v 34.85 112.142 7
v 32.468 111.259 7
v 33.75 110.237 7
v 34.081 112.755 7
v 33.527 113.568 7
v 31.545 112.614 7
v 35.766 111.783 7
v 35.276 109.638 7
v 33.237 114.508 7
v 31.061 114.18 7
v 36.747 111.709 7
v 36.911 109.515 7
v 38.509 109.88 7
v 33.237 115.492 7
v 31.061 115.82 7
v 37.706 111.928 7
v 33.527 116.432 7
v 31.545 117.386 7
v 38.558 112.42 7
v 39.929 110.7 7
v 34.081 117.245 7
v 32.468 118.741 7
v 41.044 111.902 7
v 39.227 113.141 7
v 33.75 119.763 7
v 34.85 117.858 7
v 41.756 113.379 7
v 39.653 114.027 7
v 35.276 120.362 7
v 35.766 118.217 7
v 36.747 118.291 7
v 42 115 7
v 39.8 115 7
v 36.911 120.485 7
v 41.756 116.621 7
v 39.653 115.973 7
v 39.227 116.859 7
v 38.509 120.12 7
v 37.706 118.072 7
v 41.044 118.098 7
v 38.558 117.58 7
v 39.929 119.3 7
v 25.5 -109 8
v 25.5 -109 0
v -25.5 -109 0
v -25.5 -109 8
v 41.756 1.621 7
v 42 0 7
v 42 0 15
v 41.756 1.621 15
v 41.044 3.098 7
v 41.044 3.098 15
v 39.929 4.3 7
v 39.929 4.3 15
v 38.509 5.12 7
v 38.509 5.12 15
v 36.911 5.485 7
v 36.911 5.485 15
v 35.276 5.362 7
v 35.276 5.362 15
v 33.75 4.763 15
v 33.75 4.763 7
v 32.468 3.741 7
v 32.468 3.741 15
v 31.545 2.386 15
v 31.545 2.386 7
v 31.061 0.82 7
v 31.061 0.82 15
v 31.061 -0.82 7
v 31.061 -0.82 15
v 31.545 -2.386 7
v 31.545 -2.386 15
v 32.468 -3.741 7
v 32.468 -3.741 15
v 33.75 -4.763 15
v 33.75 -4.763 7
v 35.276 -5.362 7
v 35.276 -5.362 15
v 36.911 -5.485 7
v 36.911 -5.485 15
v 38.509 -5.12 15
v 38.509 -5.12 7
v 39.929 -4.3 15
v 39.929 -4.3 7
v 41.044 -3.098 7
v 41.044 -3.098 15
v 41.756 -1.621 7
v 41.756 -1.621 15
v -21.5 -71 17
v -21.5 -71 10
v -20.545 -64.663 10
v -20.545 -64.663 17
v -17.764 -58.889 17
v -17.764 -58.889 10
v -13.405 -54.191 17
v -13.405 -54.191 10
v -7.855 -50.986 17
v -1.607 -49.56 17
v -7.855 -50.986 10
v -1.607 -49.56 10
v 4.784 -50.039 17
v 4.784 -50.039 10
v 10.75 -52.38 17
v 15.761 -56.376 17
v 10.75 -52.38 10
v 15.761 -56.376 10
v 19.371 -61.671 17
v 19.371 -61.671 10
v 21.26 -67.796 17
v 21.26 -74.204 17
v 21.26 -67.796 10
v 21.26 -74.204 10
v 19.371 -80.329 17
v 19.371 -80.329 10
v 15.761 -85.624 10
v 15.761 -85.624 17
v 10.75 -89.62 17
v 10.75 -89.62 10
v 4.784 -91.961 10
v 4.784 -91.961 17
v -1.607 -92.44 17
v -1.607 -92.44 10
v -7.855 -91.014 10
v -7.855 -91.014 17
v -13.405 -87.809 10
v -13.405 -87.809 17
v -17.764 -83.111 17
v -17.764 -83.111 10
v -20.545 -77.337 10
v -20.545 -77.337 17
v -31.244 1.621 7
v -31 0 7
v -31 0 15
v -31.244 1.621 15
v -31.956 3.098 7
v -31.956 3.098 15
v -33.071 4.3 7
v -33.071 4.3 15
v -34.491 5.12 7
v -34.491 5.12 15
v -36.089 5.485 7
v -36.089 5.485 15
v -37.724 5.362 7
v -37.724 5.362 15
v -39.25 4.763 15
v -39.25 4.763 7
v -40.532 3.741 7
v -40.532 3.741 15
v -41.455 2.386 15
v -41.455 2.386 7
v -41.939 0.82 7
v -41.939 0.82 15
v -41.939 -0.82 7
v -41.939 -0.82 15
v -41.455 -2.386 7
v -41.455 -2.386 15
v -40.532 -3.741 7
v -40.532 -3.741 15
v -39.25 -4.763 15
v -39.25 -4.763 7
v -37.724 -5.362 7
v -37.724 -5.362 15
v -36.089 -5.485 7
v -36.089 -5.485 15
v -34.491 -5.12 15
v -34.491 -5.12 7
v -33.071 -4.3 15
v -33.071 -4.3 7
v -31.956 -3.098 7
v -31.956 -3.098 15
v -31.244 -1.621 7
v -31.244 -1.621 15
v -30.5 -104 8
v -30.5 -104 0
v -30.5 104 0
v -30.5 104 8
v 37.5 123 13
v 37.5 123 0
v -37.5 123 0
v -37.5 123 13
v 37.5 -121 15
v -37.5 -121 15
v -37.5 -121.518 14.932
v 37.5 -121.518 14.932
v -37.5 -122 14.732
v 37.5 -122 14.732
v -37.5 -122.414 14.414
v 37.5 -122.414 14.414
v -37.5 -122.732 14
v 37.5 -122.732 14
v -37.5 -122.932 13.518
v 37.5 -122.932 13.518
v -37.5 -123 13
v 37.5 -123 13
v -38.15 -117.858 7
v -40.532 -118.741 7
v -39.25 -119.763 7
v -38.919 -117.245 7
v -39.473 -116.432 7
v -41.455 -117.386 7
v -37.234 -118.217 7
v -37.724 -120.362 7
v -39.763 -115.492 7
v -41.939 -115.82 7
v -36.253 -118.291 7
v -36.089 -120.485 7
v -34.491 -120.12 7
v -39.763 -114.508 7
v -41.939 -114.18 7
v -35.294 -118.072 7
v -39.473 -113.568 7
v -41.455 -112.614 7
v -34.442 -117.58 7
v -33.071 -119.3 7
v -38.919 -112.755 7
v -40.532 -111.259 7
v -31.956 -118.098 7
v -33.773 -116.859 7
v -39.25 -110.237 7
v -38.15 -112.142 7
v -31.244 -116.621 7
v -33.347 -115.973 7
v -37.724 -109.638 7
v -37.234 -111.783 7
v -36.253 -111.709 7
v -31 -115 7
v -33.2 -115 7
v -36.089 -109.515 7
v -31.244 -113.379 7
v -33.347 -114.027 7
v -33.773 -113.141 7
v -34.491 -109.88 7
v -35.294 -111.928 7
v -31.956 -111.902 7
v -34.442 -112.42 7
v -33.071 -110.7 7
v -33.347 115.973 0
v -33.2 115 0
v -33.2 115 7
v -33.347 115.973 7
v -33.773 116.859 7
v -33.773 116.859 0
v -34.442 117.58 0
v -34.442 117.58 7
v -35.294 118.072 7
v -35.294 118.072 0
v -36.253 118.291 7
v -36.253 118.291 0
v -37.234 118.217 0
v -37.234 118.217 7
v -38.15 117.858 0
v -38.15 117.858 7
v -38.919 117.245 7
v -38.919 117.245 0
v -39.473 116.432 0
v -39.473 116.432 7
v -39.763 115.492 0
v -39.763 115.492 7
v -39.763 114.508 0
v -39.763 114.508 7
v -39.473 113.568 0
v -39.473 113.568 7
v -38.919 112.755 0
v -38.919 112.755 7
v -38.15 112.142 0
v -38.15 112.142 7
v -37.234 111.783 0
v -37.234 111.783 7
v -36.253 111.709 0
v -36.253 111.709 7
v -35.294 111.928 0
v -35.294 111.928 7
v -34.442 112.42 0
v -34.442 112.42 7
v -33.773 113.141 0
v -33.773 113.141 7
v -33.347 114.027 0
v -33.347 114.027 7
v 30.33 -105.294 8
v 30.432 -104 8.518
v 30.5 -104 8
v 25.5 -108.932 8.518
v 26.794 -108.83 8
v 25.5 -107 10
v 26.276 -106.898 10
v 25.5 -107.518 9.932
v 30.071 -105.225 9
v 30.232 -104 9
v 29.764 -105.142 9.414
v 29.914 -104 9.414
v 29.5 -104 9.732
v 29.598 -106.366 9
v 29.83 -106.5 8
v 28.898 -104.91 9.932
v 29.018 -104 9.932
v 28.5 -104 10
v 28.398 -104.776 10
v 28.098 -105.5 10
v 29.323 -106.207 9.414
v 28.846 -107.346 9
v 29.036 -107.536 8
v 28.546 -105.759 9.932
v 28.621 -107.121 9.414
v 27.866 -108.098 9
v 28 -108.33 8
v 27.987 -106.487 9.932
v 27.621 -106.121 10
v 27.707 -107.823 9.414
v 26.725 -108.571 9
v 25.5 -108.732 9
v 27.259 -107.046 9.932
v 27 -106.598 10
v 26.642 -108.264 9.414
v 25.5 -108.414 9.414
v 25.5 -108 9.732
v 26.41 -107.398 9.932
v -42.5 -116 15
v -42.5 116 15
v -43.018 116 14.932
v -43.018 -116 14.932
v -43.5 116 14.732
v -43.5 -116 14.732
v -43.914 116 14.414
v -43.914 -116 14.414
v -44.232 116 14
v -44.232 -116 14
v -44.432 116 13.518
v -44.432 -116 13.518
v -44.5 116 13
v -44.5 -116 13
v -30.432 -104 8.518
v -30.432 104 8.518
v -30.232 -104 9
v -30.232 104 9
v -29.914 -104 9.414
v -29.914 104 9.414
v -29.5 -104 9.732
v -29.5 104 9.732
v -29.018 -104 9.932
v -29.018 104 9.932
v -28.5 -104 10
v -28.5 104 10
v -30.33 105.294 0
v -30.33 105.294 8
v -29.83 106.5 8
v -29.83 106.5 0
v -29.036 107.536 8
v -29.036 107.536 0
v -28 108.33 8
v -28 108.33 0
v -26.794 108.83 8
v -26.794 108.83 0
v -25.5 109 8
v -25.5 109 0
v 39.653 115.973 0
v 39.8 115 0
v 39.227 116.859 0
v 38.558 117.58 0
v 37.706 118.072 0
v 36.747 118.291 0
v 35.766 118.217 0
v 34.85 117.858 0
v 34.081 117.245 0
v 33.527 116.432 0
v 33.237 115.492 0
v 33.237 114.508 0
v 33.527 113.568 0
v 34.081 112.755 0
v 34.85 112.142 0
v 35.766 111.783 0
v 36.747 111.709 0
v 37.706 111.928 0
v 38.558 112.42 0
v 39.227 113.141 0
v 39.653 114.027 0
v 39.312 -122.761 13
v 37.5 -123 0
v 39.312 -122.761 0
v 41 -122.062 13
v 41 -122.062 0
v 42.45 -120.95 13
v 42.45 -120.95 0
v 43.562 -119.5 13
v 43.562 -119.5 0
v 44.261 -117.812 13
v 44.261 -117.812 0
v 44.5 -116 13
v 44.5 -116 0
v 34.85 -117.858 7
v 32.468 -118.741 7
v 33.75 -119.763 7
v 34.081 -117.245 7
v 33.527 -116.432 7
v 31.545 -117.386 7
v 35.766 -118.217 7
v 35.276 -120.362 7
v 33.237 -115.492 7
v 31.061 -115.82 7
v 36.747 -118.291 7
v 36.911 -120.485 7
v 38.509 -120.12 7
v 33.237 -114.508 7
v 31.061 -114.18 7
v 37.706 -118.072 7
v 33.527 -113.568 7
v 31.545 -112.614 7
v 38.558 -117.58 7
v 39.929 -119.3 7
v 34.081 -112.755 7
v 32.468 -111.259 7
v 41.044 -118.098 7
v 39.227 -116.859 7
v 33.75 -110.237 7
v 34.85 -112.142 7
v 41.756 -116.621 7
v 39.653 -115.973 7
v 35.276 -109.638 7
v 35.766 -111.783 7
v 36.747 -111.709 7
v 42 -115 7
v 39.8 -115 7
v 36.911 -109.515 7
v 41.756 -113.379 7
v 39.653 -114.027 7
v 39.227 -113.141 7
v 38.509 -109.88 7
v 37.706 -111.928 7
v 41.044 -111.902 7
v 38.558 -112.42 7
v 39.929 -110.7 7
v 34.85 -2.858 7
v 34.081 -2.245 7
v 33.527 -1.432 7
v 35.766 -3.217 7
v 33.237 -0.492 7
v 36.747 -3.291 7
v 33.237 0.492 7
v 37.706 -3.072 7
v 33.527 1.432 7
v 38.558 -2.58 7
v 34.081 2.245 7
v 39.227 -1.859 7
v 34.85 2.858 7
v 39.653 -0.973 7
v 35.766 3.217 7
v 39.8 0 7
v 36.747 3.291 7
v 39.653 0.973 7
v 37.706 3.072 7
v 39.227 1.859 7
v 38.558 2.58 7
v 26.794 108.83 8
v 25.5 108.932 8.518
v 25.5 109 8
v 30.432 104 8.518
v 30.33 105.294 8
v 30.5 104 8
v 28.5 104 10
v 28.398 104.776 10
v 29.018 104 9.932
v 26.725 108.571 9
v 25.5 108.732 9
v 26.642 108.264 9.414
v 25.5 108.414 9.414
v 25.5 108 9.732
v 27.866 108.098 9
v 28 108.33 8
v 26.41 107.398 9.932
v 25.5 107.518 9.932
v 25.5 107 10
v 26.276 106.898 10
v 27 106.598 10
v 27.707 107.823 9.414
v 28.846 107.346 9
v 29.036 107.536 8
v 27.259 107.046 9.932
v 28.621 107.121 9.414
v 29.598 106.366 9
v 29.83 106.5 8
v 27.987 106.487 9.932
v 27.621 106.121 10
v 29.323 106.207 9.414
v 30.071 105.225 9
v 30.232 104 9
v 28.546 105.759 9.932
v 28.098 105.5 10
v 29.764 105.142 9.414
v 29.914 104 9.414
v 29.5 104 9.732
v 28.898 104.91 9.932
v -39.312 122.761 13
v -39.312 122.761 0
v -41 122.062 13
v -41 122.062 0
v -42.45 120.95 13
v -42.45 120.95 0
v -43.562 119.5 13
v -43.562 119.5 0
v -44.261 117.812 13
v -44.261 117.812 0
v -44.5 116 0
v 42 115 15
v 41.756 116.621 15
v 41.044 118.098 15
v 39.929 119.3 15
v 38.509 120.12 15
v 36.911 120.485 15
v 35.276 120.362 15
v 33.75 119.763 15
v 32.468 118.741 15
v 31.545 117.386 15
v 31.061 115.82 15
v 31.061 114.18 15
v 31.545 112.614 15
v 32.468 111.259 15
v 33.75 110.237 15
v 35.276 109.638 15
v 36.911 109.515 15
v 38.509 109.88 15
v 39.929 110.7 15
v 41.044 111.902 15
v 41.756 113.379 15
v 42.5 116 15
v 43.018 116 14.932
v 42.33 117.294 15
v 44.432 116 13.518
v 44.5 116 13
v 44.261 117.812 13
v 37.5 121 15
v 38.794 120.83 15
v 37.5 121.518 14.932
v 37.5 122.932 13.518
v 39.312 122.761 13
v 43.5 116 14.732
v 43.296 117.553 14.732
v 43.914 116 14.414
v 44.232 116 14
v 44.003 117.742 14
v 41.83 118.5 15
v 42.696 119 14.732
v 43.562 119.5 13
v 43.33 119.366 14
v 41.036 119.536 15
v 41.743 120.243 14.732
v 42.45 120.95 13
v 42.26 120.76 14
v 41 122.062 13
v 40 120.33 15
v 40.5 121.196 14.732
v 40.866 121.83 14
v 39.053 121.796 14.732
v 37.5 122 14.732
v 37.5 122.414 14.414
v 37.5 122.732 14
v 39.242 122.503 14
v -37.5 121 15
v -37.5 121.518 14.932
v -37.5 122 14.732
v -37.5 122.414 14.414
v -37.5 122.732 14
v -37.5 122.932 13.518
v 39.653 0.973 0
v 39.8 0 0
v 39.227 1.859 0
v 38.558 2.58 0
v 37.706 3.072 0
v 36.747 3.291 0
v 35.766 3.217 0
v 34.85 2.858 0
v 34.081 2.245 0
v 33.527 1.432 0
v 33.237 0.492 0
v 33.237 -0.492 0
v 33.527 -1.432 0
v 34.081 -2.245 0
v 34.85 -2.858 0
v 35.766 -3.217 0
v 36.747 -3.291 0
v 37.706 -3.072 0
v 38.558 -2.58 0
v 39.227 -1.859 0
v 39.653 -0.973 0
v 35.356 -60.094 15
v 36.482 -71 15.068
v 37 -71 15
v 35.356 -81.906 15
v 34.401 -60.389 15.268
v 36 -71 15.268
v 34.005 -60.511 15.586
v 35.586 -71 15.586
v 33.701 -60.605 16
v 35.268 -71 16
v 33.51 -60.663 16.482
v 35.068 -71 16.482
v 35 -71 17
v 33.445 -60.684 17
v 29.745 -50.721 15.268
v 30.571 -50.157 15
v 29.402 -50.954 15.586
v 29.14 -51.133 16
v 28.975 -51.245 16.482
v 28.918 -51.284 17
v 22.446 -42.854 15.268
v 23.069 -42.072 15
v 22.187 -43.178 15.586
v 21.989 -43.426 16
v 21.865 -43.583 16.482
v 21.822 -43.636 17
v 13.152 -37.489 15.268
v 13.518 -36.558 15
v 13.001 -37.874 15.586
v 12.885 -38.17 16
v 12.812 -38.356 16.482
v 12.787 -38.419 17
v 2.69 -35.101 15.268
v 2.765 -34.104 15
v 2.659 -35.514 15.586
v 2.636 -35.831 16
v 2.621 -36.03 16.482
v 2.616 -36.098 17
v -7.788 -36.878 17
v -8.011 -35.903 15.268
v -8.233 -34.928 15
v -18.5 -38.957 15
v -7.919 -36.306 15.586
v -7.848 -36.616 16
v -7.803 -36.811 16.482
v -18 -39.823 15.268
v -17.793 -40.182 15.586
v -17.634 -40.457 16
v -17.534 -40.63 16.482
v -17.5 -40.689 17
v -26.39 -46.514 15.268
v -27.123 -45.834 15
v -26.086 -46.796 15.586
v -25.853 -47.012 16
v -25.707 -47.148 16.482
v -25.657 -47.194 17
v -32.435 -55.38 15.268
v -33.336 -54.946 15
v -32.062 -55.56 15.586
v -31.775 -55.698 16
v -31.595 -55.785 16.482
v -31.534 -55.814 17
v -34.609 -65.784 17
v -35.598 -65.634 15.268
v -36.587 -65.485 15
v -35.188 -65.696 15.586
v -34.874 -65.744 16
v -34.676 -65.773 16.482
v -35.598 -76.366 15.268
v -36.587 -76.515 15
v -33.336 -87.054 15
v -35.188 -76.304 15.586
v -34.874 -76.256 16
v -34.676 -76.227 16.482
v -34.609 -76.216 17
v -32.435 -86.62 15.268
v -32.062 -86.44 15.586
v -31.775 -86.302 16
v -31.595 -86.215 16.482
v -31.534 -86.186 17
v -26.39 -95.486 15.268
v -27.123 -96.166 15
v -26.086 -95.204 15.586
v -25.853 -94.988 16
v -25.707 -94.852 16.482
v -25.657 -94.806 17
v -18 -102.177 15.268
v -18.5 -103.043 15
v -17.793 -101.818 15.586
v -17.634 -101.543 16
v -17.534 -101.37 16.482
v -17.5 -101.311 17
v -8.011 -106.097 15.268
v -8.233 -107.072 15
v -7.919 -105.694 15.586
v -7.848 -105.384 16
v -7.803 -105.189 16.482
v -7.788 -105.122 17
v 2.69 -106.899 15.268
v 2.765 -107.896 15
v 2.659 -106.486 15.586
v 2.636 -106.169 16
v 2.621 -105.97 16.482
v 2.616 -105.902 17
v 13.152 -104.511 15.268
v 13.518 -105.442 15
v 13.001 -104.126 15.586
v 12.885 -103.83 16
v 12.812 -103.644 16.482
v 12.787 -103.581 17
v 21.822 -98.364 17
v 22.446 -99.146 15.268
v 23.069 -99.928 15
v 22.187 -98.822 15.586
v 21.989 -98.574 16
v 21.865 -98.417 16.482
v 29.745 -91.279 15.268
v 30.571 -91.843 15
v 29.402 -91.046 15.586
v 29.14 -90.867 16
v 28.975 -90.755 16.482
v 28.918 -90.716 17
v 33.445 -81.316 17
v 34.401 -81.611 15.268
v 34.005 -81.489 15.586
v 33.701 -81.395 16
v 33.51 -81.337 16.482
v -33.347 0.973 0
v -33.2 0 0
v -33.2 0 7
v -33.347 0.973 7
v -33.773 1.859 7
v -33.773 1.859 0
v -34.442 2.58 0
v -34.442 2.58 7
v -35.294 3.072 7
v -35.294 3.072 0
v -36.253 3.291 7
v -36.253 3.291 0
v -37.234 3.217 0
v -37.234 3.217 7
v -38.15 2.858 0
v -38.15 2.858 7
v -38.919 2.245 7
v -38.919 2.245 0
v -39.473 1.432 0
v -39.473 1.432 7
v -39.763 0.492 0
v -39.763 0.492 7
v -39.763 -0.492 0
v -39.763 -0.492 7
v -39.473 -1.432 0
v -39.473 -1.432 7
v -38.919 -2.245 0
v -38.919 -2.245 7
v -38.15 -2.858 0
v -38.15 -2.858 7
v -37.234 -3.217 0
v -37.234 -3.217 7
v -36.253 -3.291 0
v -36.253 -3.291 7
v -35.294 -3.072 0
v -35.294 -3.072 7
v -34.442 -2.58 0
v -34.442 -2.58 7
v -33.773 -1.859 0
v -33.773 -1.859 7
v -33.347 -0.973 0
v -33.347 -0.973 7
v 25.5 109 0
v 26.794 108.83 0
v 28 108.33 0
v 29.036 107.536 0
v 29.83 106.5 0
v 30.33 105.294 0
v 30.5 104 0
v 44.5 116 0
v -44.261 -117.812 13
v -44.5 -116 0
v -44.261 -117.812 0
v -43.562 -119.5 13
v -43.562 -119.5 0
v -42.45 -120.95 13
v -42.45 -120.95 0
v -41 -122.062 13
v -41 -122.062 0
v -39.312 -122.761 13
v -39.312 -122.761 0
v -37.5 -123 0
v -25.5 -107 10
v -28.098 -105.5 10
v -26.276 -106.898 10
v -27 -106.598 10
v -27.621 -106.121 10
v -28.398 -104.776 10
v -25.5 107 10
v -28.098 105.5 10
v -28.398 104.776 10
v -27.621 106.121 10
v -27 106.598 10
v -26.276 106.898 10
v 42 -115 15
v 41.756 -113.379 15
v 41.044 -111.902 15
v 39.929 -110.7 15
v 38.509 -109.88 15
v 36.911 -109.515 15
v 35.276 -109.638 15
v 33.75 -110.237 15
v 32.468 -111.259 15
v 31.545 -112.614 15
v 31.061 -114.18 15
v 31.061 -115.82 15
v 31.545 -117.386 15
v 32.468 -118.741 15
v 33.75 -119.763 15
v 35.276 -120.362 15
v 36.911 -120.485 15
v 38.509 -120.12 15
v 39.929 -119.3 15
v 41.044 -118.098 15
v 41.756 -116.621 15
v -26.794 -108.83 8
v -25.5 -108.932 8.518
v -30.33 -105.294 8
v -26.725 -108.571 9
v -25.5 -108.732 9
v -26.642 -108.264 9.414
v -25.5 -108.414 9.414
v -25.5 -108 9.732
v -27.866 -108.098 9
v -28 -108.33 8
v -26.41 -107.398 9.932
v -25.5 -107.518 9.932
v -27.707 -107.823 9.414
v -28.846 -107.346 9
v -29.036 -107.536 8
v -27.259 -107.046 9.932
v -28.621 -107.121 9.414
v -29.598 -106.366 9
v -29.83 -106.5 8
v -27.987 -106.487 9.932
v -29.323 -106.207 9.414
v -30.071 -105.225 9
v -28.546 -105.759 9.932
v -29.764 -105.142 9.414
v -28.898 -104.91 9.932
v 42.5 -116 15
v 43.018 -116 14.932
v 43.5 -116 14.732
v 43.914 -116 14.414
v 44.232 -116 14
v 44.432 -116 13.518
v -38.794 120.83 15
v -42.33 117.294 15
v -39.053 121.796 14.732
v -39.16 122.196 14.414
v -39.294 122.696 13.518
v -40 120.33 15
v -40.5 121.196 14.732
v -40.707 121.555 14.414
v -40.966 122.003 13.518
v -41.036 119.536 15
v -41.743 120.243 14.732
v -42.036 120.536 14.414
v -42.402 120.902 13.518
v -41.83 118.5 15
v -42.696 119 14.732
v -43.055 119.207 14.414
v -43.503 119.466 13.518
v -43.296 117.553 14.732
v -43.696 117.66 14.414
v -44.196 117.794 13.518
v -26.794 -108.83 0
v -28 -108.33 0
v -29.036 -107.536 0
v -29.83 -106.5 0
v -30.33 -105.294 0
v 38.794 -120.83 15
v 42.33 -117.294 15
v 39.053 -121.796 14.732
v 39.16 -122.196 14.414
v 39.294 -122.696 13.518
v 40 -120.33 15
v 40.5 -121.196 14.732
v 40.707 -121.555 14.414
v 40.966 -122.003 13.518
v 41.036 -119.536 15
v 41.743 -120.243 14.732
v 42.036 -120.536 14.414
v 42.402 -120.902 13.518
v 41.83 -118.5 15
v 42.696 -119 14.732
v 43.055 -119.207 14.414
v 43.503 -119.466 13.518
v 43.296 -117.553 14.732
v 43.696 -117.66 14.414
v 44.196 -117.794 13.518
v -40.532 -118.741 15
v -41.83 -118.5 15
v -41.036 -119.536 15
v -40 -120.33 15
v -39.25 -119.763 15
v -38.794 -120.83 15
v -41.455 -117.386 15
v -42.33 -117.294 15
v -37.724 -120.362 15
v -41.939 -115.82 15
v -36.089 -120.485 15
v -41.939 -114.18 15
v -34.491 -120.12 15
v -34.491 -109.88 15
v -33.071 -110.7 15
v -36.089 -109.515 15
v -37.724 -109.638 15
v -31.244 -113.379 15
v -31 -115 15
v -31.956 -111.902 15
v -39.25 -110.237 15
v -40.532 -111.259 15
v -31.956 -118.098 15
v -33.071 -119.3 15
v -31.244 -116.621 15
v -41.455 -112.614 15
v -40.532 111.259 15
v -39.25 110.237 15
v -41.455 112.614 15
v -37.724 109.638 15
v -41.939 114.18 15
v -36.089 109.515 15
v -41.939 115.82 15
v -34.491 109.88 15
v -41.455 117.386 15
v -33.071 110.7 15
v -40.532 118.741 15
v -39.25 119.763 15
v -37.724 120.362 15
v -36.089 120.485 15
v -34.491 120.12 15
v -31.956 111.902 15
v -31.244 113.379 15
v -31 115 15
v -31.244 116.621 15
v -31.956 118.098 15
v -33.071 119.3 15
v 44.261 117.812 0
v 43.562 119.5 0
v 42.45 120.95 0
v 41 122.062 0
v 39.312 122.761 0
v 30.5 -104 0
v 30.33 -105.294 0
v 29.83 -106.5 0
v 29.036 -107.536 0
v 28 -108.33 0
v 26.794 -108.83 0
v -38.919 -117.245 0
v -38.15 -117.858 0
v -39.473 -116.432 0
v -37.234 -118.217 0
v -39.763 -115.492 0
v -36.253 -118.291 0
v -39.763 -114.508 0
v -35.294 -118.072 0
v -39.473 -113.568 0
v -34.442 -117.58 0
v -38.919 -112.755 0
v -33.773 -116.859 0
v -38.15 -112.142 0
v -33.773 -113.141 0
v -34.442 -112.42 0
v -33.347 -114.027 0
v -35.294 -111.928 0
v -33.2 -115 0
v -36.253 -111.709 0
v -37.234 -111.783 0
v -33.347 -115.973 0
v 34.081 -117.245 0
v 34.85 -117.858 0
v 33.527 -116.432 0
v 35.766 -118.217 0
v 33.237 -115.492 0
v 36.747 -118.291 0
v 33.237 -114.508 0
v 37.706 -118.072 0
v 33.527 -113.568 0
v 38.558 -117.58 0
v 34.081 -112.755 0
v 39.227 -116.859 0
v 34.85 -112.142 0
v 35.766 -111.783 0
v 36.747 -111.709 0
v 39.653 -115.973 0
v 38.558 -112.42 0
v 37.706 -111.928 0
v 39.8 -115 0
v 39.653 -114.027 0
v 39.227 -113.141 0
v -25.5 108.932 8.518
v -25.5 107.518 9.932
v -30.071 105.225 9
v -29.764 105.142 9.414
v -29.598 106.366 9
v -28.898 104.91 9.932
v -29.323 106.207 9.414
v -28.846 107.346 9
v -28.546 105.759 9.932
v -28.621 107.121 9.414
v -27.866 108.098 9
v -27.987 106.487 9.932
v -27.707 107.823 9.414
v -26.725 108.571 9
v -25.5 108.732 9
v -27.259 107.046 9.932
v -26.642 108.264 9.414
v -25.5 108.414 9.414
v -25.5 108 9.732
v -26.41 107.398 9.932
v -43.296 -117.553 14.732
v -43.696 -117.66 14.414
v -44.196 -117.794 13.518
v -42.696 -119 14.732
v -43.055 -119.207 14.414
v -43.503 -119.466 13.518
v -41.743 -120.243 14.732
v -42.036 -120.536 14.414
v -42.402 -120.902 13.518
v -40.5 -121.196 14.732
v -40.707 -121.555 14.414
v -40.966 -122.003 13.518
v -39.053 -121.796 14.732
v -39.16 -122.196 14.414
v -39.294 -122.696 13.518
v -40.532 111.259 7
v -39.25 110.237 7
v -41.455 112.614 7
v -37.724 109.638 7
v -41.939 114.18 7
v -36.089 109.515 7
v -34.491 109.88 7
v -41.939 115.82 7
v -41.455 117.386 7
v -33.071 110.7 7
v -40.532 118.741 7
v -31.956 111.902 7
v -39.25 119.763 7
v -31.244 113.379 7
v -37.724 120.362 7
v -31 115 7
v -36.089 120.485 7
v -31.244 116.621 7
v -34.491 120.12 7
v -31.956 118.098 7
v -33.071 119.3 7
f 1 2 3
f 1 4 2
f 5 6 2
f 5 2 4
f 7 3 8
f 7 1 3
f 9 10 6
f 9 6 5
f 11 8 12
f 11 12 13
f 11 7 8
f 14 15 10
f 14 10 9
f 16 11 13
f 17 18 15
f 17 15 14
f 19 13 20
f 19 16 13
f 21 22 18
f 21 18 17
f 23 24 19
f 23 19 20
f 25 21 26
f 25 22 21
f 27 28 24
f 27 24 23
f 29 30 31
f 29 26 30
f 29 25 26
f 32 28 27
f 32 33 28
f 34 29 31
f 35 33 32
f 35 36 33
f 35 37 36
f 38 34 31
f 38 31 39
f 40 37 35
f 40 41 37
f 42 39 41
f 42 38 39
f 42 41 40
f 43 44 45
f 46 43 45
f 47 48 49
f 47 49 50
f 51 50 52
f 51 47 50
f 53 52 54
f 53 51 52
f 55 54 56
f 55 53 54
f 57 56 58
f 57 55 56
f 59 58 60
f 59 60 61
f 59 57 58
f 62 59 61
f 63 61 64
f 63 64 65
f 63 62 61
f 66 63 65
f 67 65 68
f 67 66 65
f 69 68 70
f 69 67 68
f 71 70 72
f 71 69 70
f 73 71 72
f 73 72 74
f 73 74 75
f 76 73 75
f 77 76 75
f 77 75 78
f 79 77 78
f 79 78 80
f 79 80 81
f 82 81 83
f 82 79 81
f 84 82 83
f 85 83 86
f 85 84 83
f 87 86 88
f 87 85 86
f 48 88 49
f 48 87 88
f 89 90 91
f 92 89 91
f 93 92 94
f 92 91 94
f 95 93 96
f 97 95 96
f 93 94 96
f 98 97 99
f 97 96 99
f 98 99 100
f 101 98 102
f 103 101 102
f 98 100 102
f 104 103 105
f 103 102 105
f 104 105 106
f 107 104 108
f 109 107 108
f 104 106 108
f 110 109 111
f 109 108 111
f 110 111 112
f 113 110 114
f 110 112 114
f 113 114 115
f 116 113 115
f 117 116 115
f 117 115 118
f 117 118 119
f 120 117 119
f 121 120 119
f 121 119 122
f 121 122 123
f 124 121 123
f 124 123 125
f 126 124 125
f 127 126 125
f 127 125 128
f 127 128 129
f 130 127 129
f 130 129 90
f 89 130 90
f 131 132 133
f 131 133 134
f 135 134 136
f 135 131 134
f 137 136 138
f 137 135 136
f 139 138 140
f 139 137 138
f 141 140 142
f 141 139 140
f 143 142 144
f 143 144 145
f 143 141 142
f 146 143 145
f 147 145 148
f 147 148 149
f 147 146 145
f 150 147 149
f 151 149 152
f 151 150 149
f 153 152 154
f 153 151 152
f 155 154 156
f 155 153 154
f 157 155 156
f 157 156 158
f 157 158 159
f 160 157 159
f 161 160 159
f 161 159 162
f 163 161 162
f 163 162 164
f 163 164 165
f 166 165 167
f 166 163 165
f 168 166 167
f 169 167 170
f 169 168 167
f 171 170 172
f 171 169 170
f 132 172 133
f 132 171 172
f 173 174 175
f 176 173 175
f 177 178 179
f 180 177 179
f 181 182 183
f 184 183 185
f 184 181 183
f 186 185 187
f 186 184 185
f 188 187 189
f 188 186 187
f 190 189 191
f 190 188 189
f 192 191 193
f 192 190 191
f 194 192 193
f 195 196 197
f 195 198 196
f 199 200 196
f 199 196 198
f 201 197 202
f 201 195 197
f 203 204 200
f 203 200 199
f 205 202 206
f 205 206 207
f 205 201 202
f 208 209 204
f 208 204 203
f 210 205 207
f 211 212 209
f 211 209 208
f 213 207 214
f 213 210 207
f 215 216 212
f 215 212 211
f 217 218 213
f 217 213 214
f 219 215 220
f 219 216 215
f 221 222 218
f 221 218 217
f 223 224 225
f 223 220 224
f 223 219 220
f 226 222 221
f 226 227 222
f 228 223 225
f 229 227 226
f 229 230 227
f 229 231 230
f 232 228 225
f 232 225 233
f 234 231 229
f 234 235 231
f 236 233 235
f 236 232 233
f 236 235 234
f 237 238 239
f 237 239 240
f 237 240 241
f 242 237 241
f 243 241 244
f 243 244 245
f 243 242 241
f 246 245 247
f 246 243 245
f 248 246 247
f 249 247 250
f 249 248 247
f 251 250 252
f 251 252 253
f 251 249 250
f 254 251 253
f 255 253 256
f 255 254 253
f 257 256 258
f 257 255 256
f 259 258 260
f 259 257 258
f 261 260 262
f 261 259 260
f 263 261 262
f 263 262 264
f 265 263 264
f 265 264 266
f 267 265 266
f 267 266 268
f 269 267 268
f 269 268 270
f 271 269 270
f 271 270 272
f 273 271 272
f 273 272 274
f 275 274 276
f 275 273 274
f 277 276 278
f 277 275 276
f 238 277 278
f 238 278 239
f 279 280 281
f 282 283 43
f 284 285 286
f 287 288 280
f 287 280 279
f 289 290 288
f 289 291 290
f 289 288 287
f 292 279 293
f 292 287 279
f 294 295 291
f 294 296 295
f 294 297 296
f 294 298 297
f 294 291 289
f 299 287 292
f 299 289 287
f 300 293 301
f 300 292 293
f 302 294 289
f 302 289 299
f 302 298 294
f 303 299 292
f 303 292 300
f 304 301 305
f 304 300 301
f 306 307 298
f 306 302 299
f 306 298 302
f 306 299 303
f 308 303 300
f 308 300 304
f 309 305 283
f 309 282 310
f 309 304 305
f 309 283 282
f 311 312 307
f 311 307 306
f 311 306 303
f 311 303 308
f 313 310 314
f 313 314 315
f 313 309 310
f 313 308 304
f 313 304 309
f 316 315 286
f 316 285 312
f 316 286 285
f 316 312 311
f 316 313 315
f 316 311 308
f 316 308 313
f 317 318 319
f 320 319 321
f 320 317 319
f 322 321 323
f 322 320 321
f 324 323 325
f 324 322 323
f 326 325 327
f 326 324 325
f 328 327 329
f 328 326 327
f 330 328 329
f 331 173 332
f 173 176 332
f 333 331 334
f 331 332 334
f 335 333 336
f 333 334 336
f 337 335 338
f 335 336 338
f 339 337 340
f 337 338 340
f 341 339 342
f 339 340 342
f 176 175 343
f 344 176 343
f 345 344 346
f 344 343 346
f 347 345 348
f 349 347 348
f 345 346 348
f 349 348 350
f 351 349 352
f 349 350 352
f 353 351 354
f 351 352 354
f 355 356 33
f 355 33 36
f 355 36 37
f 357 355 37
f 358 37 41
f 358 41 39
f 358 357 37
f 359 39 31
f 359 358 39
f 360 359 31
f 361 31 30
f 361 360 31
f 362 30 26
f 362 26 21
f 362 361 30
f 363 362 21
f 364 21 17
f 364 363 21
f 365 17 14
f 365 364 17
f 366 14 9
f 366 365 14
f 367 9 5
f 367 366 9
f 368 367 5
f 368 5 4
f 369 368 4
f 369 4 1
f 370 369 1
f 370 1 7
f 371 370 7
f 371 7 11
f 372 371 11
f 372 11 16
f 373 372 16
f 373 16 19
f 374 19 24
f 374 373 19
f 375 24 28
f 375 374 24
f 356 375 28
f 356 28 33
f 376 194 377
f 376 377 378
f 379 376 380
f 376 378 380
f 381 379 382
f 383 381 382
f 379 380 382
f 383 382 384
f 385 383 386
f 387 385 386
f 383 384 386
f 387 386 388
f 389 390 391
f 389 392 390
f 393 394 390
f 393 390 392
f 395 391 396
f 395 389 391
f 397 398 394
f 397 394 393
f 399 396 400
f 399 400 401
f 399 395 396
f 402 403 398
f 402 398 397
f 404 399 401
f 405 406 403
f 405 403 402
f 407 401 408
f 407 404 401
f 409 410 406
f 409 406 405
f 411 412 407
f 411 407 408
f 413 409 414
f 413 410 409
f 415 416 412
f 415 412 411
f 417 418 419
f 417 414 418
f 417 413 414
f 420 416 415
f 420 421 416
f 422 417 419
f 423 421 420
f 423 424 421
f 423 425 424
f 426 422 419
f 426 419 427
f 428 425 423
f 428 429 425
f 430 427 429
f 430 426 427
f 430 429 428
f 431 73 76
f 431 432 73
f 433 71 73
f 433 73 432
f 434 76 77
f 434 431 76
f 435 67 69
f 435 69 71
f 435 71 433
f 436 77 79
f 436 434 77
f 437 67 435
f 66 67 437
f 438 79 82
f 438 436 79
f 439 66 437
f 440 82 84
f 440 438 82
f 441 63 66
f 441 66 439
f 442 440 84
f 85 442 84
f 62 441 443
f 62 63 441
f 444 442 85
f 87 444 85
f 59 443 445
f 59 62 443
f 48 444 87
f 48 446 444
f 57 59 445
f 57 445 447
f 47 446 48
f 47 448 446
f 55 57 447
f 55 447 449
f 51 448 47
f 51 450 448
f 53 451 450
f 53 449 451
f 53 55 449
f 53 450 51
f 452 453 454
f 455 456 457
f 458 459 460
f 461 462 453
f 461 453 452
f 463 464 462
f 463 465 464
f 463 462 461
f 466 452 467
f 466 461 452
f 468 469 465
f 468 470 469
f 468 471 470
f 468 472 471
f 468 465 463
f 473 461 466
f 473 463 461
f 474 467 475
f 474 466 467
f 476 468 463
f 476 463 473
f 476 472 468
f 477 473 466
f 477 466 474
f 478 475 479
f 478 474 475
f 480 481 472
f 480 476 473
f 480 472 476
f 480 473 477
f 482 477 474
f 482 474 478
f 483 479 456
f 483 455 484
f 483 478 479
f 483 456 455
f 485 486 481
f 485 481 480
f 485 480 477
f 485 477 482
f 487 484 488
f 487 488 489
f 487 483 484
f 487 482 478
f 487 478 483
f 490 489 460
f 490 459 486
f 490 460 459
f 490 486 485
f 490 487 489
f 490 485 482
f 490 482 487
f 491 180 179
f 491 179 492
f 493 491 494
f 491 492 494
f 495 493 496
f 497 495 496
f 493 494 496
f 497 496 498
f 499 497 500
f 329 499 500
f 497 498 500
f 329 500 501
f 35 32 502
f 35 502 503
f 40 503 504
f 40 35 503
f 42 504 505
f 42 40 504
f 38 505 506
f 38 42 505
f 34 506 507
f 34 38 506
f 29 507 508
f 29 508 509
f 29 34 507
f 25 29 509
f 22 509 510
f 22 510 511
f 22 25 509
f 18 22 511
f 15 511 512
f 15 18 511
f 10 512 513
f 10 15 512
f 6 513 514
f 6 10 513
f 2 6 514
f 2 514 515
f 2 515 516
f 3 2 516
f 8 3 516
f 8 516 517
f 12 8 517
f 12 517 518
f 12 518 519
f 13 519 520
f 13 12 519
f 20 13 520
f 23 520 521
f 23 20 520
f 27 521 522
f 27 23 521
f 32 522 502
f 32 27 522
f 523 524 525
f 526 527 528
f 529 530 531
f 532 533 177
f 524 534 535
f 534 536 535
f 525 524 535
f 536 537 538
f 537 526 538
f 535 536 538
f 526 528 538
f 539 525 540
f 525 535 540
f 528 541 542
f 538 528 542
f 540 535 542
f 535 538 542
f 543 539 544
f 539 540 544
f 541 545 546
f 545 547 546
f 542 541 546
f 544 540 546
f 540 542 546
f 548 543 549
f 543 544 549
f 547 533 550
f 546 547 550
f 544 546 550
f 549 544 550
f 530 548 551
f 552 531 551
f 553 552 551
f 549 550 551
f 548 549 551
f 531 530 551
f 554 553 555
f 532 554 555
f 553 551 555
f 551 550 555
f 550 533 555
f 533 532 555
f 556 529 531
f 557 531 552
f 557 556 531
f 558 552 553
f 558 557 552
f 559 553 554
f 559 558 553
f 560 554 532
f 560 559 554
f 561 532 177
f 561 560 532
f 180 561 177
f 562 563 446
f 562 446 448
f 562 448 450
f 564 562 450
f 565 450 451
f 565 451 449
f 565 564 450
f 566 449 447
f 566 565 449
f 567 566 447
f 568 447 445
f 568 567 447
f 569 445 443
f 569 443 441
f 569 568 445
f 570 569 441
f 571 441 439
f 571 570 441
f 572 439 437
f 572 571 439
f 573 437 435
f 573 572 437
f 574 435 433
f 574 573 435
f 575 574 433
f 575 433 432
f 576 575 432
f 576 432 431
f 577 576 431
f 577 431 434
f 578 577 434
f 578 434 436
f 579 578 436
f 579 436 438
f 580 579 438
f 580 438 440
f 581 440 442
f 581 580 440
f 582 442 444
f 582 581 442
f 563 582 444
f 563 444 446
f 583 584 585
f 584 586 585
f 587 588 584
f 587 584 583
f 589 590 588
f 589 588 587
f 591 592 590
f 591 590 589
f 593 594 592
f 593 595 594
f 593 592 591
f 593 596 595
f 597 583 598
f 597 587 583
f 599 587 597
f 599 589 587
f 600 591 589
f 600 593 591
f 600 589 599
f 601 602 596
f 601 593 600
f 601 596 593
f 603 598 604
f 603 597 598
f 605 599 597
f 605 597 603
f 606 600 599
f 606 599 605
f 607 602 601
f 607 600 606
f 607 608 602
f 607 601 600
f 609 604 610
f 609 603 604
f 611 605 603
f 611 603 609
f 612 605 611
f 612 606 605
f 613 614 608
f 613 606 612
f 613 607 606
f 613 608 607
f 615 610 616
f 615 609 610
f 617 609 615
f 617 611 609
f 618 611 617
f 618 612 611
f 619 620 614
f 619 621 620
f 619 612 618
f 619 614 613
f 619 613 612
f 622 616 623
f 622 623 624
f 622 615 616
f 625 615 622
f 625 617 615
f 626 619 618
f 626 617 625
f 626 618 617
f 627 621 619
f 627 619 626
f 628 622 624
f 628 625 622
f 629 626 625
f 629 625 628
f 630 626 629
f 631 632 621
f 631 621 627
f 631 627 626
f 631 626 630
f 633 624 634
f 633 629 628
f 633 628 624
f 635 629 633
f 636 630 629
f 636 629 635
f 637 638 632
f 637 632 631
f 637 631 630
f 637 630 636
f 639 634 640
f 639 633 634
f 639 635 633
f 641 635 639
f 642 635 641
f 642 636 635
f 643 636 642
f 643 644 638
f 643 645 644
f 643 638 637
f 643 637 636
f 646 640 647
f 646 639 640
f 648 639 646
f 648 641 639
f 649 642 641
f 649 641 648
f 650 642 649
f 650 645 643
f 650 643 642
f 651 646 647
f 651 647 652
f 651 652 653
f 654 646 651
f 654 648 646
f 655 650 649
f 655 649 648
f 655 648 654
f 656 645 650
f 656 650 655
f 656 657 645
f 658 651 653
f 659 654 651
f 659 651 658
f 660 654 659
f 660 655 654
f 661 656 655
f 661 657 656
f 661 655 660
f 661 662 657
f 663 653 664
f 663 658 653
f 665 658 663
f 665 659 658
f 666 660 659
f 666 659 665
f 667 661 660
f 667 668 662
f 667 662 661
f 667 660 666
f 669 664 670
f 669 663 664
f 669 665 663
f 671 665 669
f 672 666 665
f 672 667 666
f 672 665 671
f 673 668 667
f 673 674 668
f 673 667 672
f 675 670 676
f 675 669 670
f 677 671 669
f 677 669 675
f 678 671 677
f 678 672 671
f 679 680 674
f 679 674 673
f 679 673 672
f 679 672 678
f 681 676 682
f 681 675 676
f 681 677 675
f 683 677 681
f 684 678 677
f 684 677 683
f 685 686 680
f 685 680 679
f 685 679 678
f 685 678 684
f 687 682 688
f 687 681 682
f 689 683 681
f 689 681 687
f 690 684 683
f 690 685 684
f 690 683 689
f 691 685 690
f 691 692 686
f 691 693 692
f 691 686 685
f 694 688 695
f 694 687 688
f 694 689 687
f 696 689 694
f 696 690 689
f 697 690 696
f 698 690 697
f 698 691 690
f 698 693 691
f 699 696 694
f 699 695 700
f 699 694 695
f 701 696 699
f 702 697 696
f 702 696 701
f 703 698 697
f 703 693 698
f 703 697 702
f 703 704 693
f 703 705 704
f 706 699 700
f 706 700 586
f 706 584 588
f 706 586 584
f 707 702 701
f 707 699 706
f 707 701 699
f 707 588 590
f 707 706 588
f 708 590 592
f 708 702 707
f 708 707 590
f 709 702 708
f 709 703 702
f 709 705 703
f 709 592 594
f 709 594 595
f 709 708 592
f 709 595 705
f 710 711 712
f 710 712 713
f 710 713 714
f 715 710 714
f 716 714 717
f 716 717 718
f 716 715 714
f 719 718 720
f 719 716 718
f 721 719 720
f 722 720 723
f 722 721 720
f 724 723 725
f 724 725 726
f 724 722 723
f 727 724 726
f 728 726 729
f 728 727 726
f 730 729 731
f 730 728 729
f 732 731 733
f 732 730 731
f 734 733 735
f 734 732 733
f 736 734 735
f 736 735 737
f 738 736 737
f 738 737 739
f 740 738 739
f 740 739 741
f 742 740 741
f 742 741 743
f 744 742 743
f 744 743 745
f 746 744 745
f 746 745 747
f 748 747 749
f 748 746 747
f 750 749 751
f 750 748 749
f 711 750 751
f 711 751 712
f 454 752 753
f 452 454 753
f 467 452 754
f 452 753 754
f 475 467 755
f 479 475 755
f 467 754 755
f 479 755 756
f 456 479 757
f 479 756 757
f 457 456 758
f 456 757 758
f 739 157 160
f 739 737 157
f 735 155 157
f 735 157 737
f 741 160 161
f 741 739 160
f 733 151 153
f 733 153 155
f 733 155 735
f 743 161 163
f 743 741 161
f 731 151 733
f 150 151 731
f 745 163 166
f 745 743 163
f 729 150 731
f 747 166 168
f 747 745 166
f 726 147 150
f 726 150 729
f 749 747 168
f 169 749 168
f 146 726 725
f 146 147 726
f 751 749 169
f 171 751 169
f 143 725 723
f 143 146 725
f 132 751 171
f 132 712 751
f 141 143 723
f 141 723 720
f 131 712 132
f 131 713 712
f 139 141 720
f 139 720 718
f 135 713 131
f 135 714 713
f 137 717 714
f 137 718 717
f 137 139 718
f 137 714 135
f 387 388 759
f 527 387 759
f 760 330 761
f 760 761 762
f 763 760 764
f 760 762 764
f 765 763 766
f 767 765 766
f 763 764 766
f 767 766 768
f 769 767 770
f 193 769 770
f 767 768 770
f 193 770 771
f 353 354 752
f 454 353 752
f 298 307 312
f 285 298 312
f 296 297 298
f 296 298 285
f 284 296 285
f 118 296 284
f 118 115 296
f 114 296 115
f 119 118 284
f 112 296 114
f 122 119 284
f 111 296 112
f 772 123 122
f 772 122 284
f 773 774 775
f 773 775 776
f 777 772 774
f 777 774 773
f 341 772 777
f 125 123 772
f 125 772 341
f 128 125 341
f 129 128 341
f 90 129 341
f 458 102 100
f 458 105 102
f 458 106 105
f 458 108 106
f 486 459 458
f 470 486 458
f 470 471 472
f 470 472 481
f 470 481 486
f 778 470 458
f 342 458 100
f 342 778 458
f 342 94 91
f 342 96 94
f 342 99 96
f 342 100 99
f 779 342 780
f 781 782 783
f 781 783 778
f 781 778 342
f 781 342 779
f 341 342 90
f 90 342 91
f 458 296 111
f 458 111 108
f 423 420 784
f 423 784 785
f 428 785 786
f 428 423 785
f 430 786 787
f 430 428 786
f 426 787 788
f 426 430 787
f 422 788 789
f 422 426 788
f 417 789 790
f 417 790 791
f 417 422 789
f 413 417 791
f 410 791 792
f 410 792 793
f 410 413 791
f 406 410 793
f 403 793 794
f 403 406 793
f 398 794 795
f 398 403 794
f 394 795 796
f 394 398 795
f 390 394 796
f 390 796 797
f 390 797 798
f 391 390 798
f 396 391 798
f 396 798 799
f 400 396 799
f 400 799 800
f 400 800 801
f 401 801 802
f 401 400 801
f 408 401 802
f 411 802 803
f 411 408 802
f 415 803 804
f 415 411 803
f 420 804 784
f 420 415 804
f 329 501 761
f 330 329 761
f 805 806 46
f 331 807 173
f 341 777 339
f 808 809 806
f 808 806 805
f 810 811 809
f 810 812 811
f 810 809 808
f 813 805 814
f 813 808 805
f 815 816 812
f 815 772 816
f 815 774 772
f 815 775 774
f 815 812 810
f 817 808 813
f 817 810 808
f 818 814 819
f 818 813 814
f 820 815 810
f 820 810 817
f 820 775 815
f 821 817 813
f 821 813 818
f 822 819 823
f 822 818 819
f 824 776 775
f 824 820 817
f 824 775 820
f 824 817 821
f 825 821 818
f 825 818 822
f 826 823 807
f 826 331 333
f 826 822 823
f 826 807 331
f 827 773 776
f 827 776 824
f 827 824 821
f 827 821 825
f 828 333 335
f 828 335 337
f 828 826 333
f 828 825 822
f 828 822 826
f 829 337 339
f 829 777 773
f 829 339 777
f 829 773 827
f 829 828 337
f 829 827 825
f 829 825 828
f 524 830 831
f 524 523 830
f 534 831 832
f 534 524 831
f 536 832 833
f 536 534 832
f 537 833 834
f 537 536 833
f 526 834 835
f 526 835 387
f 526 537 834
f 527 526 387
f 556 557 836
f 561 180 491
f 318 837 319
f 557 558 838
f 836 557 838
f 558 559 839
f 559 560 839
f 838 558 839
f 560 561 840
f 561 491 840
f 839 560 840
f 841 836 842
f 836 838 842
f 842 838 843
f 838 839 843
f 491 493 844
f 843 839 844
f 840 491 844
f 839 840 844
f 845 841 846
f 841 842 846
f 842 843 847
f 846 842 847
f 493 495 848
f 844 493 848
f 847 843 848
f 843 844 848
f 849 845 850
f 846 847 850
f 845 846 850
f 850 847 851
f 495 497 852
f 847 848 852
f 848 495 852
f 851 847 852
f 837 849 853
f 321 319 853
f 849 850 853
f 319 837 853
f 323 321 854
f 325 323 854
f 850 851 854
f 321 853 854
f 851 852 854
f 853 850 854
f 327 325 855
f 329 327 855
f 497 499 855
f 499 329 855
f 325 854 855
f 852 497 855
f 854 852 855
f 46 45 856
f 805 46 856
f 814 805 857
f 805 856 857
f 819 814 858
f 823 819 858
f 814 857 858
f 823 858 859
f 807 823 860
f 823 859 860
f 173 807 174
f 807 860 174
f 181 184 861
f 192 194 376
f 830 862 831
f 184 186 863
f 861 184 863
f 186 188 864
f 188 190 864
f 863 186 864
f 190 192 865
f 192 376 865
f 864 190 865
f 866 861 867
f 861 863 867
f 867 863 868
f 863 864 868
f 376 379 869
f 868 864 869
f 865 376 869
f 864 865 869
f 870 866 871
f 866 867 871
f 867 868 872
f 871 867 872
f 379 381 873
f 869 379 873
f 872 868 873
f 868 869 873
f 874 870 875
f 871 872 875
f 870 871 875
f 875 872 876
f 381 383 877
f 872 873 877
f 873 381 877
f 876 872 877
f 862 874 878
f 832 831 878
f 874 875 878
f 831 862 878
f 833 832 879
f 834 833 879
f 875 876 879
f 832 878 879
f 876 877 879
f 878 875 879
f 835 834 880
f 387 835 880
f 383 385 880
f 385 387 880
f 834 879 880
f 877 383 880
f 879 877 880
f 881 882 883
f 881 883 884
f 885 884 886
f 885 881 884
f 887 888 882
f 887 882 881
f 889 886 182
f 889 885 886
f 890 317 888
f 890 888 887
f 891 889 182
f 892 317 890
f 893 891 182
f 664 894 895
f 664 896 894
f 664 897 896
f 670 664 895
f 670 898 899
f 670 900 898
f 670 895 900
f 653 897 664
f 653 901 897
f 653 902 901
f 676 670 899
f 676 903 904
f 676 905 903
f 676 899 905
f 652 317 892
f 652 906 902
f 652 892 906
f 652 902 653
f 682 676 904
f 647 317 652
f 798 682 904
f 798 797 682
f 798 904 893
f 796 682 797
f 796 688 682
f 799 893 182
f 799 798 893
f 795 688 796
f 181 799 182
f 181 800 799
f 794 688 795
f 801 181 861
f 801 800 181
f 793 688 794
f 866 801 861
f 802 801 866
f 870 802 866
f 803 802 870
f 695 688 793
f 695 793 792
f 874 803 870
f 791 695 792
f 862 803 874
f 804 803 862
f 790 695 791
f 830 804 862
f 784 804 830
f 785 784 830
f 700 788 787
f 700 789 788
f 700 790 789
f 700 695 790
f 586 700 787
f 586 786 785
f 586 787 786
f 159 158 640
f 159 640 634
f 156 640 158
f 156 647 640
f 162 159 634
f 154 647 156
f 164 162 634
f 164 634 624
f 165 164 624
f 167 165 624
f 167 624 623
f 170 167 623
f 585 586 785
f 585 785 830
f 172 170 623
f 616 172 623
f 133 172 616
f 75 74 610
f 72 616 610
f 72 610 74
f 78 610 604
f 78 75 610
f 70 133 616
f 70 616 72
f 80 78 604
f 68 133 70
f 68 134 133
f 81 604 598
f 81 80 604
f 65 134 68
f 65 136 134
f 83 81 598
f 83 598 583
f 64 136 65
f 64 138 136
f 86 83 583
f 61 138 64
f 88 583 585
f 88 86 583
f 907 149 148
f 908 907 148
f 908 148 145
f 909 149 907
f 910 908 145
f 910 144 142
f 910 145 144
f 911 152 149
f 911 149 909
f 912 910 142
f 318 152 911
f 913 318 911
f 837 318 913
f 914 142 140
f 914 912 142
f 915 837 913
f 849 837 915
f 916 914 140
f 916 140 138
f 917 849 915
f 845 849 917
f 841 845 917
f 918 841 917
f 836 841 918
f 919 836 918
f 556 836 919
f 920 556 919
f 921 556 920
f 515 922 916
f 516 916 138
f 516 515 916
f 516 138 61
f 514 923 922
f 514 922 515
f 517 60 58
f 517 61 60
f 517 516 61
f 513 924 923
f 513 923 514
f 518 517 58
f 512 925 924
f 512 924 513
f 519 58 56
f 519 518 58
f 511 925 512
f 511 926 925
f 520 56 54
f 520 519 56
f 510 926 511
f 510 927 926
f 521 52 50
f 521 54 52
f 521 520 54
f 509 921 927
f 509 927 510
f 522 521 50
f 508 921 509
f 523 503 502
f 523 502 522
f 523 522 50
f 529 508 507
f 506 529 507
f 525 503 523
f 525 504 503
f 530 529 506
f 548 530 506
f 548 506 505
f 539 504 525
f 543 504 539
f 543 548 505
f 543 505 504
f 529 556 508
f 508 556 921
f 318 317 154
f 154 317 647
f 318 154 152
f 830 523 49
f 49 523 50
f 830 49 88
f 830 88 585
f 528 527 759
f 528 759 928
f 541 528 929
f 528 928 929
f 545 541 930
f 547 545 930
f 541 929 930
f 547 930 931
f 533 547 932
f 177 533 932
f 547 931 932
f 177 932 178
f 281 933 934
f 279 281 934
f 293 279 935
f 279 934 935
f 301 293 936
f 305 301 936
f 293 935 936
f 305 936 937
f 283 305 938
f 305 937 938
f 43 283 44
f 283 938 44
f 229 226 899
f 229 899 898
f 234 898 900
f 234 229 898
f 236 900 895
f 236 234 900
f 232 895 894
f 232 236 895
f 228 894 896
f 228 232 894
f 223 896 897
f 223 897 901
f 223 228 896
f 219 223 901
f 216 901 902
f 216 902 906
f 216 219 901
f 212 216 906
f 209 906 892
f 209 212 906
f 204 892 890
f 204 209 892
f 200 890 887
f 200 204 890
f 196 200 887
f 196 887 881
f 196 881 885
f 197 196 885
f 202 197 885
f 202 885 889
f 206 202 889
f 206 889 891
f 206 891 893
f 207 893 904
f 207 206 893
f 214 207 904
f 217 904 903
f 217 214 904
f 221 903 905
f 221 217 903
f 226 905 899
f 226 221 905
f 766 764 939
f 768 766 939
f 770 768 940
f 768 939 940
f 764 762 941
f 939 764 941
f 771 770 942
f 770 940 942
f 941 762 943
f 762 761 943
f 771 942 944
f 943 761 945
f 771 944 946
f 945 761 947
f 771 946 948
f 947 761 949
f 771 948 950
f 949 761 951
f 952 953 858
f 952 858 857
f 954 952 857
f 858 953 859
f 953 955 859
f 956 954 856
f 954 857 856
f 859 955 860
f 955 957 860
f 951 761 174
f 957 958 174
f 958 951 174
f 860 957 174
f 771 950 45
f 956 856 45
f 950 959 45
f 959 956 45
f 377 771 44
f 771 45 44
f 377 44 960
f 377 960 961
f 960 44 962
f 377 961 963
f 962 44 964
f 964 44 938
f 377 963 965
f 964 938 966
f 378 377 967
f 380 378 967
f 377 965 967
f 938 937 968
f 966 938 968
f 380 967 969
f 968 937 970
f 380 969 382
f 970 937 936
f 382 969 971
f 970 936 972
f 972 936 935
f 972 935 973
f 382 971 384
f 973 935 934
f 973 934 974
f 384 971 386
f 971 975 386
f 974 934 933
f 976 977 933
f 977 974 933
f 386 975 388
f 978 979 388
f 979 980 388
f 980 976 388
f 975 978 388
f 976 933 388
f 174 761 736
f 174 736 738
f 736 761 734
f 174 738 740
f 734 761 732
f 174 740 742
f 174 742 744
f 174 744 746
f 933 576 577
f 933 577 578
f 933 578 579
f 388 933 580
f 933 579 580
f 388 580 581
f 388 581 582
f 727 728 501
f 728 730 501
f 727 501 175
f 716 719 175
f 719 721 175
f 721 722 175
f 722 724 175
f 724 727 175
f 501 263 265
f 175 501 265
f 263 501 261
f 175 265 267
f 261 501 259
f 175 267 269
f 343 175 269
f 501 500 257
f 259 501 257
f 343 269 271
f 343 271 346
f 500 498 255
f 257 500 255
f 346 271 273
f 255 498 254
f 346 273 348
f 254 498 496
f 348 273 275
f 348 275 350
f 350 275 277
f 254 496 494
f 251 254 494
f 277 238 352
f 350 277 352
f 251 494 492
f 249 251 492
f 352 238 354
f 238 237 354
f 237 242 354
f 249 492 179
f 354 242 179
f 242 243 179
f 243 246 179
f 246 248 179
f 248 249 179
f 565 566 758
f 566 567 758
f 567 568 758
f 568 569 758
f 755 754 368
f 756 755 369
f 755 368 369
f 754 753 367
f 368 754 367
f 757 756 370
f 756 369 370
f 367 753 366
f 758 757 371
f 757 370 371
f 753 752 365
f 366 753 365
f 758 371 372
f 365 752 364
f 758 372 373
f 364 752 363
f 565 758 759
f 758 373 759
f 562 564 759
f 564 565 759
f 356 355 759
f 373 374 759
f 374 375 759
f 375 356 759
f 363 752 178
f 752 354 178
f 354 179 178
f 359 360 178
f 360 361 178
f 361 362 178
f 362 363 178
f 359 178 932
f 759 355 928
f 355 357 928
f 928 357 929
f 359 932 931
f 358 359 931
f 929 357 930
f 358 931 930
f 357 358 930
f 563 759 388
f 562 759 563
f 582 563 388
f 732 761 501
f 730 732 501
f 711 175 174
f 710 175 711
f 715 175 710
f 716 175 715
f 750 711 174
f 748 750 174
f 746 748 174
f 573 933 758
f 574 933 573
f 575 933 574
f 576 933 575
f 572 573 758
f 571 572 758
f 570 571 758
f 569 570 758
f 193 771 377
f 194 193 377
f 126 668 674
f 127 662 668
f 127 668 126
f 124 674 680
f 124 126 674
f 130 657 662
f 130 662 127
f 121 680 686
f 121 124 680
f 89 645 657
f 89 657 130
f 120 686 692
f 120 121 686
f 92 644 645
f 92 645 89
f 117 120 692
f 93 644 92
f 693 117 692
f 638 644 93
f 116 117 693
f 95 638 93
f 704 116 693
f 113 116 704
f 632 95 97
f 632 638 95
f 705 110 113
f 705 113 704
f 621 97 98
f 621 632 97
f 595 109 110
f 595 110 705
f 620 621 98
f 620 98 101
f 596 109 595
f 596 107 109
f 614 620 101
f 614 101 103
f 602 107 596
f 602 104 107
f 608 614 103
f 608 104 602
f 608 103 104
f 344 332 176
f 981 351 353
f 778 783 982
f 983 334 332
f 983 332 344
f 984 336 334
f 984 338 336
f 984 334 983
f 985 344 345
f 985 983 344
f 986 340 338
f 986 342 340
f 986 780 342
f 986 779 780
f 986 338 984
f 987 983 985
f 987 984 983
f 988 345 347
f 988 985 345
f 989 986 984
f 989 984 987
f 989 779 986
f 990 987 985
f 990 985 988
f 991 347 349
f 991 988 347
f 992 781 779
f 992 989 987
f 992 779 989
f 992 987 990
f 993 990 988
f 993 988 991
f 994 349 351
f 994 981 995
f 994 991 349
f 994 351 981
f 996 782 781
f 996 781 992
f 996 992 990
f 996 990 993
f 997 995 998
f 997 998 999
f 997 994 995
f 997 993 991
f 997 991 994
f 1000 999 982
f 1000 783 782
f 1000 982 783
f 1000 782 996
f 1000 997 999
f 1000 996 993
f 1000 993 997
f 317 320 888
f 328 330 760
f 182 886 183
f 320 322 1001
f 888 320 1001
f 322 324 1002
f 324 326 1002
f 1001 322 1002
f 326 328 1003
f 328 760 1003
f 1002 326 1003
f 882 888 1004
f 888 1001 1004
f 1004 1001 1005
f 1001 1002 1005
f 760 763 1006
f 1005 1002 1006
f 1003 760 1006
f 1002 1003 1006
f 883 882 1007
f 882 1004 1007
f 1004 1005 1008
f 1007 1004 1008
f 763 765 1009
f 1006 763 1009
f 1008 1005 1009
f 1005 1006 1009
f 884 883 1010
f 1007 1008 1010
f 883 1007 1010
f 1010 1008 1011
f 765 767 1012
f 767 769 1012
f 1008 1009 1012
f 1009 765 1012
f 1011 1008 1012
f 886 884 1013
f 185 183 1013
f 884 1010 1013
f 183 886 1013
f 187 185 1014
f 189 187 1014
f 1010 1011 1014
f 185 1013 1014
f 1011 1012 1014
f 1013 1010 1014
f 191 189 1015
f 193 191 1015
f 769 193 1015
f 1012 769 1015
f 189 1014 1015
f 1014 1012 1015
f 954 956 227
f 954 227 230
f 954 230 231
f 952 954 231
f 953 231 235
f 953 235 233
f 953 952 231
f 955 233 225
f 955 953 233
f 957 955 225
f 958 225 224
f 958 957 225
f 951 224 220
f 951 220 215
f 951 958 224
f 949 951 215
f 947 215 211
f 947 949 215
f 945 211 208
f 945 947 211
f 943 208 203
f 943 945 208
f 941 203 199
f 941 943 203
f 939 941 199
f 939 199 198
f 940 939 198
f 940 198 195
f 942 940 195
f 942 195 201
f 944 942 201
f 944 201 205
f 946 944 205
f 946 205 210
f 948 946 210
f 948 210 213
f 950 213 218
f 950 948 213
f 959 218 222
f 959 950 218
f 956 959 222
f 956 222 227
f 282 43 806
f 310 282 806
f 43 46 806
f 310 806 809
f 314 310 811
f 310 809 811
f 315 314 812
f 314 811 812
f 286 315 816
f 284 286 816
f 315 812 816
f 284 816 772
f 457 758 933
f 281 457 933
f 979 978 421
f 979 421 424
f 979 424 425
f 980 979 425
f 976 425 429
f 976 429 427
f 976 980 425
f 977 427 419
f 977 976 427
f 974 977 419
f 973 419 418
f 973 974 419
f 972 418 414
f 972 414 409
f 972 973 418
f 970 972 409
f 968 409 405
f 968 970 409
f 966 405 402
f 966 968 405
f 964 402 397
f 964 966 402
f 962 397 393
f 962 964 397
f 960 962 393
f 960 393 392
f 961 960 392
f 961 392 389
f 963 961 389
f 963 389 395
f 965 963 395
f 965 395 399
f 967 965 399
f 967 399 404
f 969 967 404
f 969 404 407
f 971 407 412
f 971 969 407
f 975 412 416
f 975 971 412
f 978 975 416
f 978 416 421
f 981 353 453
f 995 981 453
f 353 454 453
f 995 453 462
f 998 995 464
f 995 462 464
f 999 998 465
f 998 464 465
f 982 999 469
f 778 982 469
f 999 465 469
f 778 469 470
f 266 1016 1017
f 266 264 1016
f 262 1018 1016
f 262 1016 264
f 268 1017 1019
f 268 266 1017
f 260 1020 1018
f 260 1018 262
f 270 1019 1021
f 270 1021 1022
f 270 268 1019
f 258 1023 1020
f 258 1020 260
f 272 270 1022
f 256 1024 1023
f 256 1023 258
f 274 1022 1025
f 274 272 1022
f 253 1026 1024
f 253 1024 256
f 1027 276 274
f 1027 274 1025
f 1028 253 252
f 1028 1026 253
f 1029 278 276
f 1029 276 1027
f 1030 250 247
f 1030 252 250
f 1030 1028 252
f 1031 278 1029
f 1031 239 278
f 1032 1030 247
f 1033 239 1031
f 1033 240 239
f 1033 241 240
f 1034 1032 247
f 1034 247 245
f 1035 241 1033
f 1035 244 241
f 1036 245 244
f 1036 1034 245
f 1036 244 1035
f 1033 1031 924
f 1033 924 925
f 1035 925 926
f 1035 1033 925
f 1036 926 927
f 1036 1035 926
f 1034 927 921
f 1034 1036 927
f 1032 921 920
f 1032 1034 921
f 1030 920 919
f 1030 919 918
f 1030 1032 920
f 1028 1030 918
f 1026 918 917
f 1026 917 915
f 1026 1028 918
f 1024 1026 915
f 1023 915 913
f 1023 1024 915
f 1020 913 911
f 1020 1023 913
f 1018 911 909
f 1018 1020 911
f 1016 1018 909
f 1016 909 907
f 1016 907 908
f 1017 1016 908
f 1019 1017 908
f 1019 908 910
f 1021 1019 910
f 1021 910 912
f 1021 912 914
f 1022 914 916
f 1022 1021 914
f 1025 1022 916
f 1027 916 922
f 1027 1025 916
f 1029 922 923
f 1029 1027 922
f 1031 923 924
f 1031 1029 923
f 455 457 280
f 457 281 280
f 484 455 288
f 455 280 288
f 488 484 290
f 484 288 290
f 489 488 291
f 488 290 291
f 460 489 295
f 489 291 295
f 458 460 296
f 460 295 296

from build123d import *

# Parameters (mm, degrees)
EXTRUDE_1_DEPTH           = 15
SKETCH_2_R                = 35
EXTRUDE_2_DEPTH           = 2
FILLET_1_R                = 2
HOLE_WIZARD_M48_1_D       = 43
CUT_EXTRUDE_1_DEPTH       = 10
FILLET_2_R                = 2
HOLE_START                = 7
HOLE_WIZARD_1_OUTLINE_R   = 5.5
HOLE_WIZARD_1_DEPTH       = 8
HOLE_WIZARD_1_2_OUTLINE_R = 3.3
HOLE_WIZARD_1_2_DEPTH     = 7


# Read off the part's stored shape, not the designer's step: 孔1
with BuildPart() as part:
    # 草图1 → 凸台-拉伸1 (new body)
    with BuildSketch(Plane.XY):
        with BuildLine():
            Line((-37.5, -123), (37.5, -123))
            ThreePointArc((37.5, -123), (42.449747468, -120.949747468), (44.5, -116))
            Line((44.5, -116), (44.5, 116))
            ThreePointArc((44.5, 116), (42.449747468, 120.949747468), (37.5, 123))
            Line((37.5, 123), (-37.5, 123))
            ThreePointArc((-37.5, 123), (-42.449747468, 120.949747468), (-44.5, 116))
            Line((-44.5, 116), (-44.5, -116))
            ThreePointArc((-44.5, -116), (-42.449747468, -120.949747468), (-37.5, -123))
        make_face()
    extrude(amount=EXTRUDE_1_DEPTH)

    # 草图2 → 凸台-拉伸2 (add)
    with BuildSketch(Plane.XY.offset(15)):
        with Locations((0, -71)):
            Circle(SKETCH_2_R)
    extrude(amount=EXTRUDE_2_DEPTH)

    # 圆角1
    fillet_1_edges = [part.edges().sort_by_distance(p)[0] for p in [
        (42.449747468, 120.949747468, 15),
        (0, 123, 15),
        (-42.449747468, 120.949747468, 15),
        (-44.5, 0, 15),
        (-35, -71, 15),
        (-42.449747468, -120.949747468, 15),
        (0, -123, 15),
        (42.449747468, -120.949747468, 15),
        (44.5, 0, 15),
    ]]
    fillet(fillet_1_edges, radius=FILLET_1_R - 0.0001)  # a hair under: the kernel refuses the full size

    # M48 螺纹孔1 (through all)
    with Locations(Plane.XY.offset(17)):
        with Locations((0, -71)):
            Hole(HOLE_WIZARD_M48_1_D / 2)

    # 草图5 → 切除-拉伸1 (cut)
    with BuildSketch(Plane(origin=(0, 0, 0), x_dir=(-1, 0, 0), z_dir=(0, 0, -1))):
        with BuildLine():
            Line((-25.5, -109), (25.5, -109))
            ThreePointArc((25.5, -109), (29.035533906, -107.535533906), (30.5, -104))
            Line((30.5, -104), (30.5, 104))
            ThreePointArc((30.5, 104), (29.035533906, 107.535533906), (25.5, 109))
            Line((25.5, 109), (-25.5, 109))
            ThreePointArc((-25.5, 109), (-29.035533906, 107.535533906), (-30.5, 104))
            Line((-30.5, 104), (-30.5, -104))
            ThreePointArc((-30.5, -104), (-29.035533906, -107.535533906), (-25.5, -109))
        make_face()
    extrude(amount=-CUT_EXTRUDE_1_DEPTH, mode=Mode.SUBTRACT)

    # 圆角2
    fillet_2_edges = [part.edges().sort_by_distance(p)[0] for p in [
        (-29.035533906, -107.535533906, 10),
        (0, -109, 10),
        (29.035533906, -107.535533906, 10),
        (30.5, 0, 10),
        (29.035533906, 107.535533906, 10),
        (0, 109, 10),
        (-29.035533906, 107.535533906, 10),
        (-30.5, 0, 10),
    ]]
    fillet(fillet_2_edges, radius=FILLET_2_R)

    # 孔1 outline → 孔1 (cut)
    with BuildSketch(Plane.XY.offset(HOLE_START)):
        with Locations((36.5, 0)):
            Circle(HOLE_WIZARD_1_OUTLINE_R)
        with Locations((-36.5, 0)):
            Circle(HOLE_WIZARD_1_OUTLINE_R)
        with Locations((36.5, -115)):
            Circle(HOLE_WIZARD_1_OUTLINE_R)
        with Locations((-36.5, 115)):
            Circle(HOLE_WIZARD_1_OUTLINE_R)
        with Locations((-36.5, -115)):
            Circle(HOLE_WIZARD_1_OUTLINE_R)
        with Locations((36.5, 115)):
            Circle(HOLE_WIZARD_1_OUTLINE_R)
    extrude(amount=HOLE_WIZARD_1_DEPTH, mode=Mode.SUBTRACT)

    # Hole Wizard 1 2 outline → Hole Wizard 1 2 (cut)
    with BuildSketch(Plane.XY):
        with Locations((36.5, 0)):
            Circle(HOLE_WIZARD_1_2_OUTLINE_R)
        with Locations((-36.5, 0)):
            Circle(HOLE_WIZARD_1_2_OUTLINE_R)
        with Locations((36.5, -115)):
            Circle(HOLE_WIZARD_1_2_OUTLINE_R)
        with Locations((-36.5, 115)):
            Circle(HOLE_WIZARD_1_2_OUTLINE_R)
        with Locations((-36.5, -115)):
            Circle(HOLE_WIZARD_1_2_OUTLINE_R)
        with Locations((36.5, 115)):
            Circle(HOLE_WIZARD_1_2_OUTLINE_R)
    extrude(amount=HOLE_WIZARD_1_2_DEPTH, mode=Mode.SUBTRACT)


solid = part.part
